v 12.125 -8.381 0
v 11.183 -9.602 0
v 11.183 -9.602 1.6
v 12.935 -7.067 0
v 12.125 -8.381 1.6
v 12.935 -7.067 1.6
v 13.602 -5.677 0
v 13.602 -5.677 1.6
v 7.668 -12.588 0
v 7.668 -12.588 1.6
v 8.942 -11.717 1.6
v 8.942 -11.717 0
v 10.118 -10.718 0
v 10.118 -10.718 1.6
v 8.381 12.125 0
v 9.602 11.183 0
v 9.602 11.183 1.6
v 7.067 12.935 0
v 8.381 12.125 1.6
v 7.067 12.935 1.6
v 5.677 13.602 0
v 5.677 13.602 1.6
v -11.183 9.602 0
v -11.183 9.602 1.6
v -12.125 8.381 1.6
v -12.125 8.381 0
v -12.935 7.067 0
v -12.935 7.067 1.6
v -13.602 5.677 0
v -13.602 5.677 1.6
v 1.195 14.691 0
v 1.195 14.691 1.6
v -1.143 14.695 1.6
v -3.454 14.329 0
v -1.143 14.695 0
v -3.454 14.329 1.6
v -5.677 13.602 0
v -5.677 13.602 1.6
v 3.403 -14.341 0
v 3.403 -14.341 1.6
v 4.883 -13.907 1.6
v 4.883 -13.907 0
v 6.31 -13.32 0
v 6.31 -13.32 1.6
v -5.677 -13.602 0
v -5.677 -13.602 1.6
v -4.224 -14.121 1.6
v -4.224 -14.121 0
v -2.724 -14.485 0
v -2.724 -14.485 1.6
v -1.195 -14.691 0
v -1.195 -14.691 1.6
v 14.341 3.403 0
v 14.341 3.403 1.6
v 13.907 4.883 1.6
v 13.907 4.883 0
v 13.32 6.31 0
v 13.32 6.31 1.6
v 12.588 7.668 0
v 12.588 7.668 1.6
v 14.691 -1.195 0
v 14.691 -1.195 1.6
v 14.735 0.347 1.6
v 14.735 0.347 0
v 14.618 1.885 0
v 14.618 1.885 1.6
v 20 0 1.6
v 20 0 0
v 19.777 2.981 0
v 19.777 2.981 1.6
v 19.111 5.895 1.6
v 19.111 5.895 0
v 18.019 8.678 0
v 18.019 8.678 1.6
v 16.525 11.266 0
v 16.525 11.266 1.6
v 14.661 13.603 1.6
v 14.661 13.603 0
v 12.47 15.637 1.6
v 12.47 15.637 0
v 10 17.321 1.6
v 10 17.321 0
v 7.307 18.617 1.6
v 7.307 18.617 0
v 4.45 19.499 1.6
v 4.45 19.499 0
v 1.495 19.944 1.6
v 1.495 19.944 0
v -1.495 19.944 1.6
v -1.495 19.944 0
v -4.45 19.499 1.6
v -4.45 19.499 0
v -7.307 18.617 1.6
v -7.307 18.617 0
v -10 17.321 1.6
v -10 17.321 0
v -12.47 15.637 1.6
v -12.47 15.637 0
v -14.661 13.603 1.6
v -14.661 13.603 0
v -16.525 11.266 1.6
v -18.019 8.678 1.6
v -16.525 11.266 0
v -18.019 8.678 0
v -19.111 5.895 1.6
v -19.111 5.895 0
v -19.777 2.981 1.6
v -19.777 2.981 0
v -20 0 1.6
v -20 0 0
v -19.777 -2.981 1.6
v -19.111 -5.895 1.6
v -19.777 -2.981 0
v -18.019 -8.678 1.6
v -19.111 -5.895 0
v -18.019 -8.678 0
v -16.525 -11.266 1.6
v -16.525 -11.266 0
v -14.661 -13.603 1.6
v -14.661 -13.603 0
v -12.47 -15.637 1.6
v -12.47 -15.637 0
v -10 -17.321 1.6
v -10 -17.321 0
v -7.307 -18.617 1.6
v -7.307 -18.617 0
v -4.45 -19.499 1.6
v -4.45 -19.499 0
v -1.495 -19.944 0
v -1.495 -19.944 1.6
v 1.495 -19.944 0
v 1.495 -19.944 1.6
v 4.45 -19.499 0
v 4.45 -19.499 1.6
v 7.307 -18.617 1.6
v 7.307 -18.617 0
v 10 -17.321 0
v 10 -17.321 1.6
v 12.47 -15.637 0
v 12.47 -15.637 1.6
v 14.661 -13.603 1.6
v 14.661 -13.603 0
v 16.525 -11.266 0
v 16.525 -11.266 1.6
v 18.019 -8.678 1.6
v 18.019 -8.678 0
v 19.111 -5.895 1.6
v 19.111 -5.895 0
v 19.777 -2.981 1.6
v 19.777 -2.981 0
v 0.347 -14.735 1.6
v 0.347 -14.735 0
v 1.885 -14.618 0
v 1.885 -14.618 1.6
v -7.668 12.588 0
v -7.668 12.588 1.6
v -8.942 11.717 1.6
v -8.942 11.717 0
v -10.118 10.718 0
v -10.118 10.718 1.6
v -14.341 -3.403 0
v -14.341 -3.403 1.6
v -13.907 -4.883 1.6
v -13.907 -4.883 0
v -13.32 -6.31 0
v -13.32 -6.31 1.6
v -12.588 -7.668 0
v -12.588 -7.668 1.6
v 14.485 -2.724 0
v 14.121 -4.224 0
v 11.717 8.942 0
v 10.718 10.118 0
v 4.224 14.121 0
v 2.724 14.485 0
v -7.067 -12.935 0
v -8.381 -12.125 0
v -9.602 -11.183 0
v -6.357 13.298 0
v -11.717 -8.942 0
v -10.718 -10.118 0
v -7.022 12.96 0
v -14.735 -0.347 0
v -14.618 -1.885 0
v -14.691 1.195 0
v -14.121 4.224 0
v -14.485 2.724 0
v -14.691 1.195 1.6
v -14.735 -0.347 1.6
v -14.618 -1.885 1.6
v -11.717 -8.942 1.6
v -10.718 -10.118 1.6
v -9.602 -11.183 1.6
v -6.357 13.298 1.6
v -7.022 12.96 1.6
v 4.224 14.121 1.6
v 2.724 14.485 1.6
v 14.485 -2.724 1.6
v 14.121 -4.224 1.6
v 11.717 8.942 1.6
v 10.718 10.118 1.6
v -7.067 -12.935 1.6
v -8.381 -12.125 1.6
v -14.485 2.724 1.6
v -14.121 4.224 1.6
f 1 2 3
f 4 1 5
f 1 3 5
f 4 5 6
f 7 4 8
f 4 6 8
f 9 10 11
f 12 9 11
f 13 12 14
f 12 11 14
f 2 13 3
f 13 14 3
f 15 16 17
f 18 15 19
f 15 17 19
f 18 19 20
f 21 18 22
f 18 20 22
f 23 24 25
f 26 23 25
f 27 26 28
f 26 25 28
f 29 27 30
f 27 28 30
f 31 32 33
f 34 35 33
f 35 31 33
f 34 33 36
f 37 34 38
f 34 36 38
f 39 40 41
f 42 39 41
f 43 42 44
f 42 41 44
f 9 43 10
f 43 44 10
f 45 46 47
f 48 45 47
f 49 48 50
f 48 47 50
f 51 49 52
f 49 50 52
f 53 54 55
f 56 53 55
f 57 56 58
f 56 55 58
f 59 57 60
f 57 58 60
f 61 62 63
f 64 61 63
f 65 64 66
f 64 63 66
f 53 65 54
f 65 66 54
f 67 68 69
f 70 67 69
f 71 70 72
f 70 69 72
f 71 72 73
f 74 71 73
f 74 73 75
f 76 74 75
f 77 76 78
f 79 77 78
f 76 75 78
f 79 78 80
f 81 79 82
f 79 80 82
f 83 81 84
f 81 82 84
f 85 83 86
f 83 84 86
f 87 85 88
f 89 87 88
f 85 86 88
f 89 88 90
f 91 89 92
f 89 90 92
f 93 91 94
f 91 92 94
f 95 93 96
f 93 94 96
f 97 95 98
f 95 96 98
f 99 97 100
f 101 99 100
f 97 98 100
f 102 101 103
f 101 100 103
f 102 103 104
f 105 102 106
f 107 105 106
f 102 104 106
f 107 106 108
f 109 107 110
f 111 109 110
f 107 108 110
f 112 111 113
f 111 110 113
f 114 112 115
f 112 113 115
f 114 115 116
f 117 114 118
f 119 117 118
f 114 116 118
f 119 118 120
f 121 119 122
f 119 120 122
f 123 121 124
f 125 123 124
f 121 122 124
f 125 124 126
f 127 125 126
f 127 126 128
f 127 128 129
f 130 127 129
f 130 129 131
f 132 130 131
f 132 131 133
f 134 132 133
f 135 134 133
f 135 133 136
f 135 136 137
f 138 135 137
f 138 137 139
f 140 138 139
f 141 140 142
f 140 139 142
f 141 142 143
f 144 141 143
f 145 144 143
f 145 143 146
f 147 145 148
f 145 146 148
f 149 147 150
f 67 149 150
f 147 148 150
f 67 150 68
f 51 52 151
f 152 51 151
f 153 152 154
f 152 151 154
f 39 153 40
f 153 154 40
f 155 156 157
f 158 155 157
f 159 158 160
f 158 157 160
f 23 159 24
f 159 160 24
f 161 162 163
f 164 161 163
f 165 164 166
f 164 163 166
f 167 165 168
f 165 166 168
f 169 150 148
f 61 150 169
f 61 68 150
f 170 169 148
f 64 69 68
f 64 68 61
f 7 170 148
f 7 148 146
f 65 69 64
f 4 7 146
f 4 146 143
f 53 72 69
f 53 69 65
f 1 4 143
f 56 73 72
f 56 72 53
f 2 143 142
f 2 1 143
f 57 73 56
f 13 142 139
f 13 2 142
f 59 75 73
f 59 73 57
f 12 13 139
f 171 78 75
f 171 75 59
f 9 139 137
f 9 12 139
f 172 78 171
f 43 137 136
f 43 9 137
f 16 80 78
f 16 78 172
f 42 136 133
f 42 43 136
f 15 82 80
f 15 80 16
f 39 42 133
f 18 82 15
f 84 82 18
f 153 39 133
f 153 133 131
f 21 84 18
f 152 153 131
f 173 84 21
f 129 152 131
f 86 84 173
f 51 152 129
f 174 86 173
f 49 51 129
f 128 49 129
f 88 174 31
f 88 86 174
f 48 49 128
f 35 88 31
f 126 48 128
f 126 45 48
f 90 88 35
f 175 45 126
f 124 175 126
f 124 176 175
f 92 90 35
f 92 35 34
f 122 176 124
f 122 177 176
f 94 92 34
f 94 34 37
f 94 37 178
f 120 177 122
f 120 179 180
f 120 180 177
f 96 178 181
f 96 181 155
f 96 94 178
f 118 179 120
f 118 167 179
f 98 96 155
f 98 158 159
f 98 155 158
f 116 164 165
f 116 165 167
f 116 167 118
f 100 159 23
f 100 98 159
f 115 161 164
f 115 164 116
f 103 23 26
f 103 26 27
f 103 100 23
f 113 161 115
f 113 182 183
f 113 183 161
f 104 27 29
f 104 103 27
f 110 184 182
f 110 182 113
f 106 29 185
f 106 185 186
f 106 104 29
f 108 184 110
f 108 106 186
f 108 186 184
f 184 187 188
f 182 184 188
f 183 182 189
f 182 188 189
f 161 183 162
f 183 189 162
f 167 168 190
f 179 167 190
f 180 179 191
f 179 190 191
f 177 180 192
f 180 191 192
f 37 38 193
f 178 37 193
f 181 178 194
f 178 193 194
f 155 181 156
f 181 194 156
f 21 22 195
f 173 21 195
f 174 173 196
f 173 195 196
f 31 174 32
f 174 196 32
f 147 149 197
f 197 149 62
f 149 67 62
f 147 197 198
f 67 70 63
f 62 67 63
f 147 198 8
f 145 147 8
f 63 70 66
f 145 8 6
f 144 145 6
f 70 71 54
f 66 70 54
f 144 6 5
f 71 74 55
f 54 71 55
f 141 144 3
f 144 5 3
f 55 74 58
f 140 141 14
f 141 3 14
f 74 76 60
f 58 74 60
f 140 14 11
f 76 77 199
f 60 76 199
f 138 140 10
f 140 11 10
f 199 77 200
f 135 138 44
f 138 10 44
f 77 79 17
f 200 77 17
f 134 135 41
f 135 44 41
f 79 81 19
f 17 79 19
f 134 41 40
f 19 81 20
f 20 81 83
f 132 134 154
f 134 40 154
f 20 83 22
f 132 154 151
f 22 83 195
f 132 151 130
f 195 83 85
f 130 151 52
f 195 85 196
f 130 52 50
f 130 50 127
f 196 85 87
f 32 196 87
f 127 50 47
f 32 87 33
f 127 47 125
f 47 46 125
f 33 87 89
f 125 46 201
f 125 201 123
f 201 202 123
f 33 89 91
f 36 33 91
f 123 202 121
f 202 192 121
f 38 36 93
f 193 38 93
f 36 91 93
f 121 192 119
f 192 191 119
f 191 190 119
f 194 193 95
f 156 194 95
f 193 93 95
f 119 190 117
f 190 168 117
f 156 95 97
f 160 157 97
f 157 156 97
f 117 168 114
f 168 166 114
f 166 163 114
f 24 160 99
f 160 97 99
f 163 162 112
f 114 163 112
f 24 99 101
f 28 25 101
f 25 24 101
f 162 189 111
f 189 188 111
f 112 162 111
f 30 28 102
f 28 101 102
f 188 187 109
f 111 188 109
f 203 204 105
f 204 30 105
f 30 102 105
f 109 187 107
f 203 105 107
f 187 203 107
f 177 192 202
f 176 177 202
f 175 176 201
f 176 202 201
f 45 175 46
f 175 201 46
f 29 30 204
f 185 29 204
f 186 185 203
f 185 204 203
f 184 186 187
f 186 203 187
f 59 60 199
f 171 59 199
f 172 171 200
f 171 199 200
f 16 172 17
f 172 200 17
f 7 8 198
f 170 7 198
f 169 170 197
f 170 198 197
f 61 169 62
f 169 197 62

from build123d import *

# Parameters (mm, degrees)
ESQUISSE1_R                  = 20
ESQUISSE1_R_2                = 16.385
BASE_EXTRUSION_DEPTH         = 1.6
BOSS_EXTRU_5_DEPTH           = 1.6
R_P_TITION_CIRCULAIRE2_COUNT = 20


with BuildPart() as part:
    # Esquisse1 → Base-Extrusion (new body)
    with BuildSketch(Plane.XY):
        Circle(ESQUISSE1_R)
        Circle(ESQUISSE1_R_2, mode=Mode.SUBTRACT)
    extrude(amount=BASE_EXTRUSION_DEPTH)

    # Esquisse3 → Boss.-Extru.5 (add)
    with BuildSketch(Plane.XY.offset(1.6)):
        with BuildLine():
            Line((1.628948568, 15.499589628), (1.398577628, 14.834398125))
            Line((1.398577628, 14.834398125), (1.195374634, 14.690915144))
            ThreePointArc((1.195374634, 14.690915144), (-2.305760746, 14.558000401), (-5.676611278, 13.602499501))
            Line((-5.676611278, 13.602499501), (-5.914207488, 13.676166747))
            Line((-5.914207488, 13.676166747), (-6.338858752, 14.237612925))
            ThreePointArc((-6.338858752, 14.237612925), (-6.917683544, 14.610159172), (-7.600152086, 14.520350848))
            ThreePointArc((-7.600152086, 14.520350848), (-2.563821531, 16.187332073), (2.74113899, 16.158250448))
            ThreePointArc((2.74113899, 16.158250448), (2.064320537, 16.032768861), (1.628948568, 15.499589628))
        make_face()
    boss_extru_5 = extrude(amount=-BOSS_EXTRU_5_DEPTH)

    # Répétition circulaire2: Boss.-Extru.5 ×20 about axis
    r_p_tition_circulaire2_axis = Axis((0, 0, 0), (0, 0, -1))
    for i in range(1, R_P_TITION_CIRCULAIRE2_COUNT):
        add(boss_extru_5.rotate(r_p_tition_circulaire2_axis, i * 360 / R_P_TITION_CIRCULAIRE2_COUNT))


solid = part.part
